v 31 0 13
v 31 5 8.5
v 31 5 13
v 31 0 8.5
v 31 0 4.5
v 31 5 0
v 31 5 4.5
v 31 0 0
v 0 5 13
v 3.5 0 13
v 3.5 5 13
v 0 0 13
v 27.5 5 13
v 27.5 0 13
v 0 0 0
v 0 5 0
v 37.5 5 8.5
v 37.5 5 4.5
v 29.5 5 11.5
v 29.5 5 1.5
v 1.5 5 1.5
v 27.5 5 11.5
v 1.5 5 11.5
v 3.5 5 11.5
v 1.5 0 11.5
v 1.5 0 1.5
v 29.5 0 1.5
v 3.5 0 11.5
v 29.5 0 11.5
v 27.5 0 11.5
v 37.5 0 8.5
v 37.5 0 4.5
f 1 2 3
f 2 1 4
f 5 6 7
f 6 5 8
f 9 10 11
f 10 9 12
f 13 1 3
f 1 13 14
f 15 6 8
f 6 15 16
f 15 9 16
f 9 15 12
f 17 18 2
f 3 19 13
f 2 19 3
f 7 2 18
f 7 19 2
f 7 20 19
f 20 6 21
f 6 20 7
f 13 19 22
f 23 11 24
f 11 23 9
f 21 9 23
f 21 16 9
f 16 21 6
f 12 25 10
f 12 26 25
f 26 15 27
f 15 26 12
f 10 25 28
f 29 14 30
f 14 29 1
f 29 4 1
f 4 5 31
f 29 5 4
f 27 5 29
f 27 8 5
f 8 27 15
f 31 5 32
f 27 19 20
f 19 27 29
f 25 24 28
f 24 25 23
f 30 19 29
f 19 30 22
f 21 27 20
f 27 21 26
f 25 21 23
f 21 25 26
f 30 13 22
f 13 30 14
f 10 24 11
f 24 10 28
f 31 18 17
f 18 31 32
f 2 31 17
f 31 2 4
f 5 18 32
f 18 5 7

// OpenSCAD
frame_width = 28; // Width of frame if looked from the size (normally 25mm or 28mm)
frame_wood_thickness = 10; // Width of frame if looked from the front (normally 8 to 10mm)
spacer_height = 5; // Overall height of spacer (5mm worked good) 
spacer_overhang = 2; // Length of "holding clip" to securly attach the spacer at the inner side of the frame
material_thickness = 1.5; // Thickness of spacer (the thicker the stronger (but less flexibel))
beespace = 8; // Normally 8mm (for a frame that has a width of 28mm) -> Change accordingly if you use other frame widths or different beespaces
nipple_thickness = 4; // Witdh of spacer nipple if looked from the front (3-4 mm have been useful)

/* [Hidden] */
//production_variance = 0.1; //not used so far
padding = 0.1; //do not change (used to eliminate zero space surfaces)
$fa=0.5;
$fs=0.5;

module framespacer (){

difference (){
    cube ([frame_width+(2*material_thickness), spacer_height, frame_wood_thickness+(2*material_thickness)]);
    
    translate ([material_thickness,-padding,material_thickness]) cube([frame_width,spacer_height+(2*padding),frame_wood_thickness]);
    translate ([material_thickness+spacer_overhang,-padding,material_thickness+frame_wood_thickness-padding]) cube([frame_width-(2*spacer_overhang),spacer_height+(2*padding),2*material_thickness]);
  }
   union () {
    translate ([frame_width+(2*material_thickness), 0, (((2*material_thickness)+frame_wood_thickness)/2)-(nipple_thickness/2)]) cube([beespace-material_thickness,spacer_height,nipple_thickness]);
    }

}

framespacer();
